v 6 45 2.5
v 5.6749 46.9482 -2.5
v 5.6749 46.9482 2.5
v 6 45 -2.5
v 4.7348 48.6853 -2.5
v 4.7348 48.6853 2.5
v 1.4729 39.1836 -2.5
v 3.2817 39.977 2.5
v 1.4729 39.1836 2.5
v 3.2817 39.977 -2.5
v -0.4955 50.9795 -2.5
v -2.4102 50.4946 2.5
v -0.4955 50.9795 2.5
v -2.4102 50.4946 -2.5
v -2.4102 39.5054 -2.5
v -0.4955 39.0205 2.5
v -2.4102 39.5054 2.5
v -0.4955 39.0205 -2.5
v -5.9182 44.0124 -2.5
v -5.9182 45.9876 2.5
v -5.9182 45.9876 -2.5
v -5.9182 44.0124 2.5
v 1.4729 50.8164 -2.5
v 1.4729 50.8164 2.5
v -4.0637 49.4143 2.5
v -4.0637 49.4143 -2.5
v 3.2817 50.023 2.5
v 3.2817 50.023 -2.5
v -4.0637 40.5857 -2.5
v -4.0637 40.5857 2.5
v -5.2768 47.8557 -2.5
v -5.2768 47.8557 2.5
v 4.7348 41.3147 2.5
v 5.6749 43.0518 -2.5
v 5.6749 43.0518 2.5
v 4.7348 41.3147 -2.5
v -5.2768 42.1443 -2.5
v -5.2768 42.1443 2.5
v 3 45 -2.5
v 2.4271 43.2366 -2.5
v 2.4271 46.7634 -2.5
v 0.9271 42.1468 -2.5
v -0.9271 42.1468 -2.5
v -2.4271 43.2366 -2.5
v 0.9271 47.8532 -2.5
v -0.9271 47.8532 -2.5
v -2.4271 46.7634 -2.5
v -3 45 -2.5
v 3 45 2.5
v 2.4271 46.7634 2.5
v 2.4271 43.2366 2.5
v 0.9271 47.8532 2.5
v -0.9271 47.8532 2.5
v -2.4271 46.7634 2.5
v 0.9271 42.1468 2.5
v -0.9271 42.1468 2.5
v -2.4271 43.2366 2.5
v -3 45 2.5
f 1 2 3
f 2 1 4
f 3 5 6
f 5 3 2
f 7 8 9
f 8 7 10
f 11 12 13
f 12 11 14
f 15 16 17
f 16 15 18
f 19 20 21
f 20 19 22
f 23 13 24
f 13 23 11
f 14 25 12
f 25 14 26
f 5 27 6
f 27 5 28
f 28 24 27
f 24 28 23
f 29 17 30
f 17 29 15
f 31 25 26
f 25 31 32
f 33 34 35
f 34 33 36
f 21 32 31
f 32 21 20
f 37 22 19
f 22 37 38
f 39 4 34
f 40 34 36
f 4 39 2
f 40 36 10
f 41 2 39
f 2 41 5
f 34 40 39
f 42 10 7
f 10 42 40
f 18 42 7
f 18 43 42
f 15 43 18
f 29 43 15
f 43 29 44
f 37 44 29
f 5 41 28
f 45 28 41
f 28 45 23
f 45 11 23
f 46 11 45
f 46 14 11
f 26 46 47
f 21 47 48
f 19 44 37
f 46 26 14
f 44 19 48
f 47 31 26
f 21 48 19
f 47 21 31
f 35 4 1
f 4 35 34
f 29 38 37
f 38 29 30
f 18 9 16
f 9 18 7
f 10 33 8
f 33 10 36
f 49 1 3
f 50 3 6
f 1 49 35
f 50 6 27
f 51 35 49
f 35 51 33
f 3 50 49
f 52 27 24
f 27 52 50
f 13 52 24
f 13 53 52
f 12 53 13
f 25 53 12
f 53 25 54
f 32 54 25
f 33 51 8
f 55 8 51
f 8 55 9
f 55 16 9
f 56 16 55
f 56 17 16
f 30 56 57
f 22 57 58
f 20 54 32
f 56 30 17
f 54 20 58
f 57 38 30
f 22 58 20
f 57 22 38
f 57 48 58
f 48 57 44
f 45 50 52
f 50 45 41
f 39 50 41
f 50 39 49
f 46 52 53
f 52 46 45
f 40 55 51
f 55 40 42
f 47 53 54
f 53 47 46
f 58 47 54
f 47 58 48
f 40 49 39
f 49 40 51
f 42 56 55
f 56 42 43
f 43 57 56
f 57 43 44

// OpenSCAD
h = 5;
filename = "beer.dxf";
scale = 0.28;

module feature(){
		translate([0,30,0])scale([scale,scale,1])translate([0,0,-h/2])linear_extrude(height = h) import(filename);
}

module six_feature(){
	union() {
		for(i = [0:360 / 6:360]){
			rotate([0,0,i]){
				feature();
			}
		}
	}
}

module base(){
	difference(){
		scale([0.7,0.7,1])translate([0,0,-h/2])linear_extrude(height = h) import("snowflake.dxf");
		difference(){
			translate([0,0,-2.5])cylinder(h,40,40);
			translate([0,0,-2.5])cylinder(h,20,20);
		}
	}
}


module loop() {
	translate([0,45,0]) {
		union(){
			difference() {
				cylinder(h,6,6, center = true);
				cylinder(h,3,3, center = true);
			}
			//translate([0,-10,0])cube([5,10,5], center = true);
		}
	}
}


union() {
	six_feature();
	base();
	loop();
}

//translate([0,0,-5]) color([0,1,0]) cylinder(h,40,40);
